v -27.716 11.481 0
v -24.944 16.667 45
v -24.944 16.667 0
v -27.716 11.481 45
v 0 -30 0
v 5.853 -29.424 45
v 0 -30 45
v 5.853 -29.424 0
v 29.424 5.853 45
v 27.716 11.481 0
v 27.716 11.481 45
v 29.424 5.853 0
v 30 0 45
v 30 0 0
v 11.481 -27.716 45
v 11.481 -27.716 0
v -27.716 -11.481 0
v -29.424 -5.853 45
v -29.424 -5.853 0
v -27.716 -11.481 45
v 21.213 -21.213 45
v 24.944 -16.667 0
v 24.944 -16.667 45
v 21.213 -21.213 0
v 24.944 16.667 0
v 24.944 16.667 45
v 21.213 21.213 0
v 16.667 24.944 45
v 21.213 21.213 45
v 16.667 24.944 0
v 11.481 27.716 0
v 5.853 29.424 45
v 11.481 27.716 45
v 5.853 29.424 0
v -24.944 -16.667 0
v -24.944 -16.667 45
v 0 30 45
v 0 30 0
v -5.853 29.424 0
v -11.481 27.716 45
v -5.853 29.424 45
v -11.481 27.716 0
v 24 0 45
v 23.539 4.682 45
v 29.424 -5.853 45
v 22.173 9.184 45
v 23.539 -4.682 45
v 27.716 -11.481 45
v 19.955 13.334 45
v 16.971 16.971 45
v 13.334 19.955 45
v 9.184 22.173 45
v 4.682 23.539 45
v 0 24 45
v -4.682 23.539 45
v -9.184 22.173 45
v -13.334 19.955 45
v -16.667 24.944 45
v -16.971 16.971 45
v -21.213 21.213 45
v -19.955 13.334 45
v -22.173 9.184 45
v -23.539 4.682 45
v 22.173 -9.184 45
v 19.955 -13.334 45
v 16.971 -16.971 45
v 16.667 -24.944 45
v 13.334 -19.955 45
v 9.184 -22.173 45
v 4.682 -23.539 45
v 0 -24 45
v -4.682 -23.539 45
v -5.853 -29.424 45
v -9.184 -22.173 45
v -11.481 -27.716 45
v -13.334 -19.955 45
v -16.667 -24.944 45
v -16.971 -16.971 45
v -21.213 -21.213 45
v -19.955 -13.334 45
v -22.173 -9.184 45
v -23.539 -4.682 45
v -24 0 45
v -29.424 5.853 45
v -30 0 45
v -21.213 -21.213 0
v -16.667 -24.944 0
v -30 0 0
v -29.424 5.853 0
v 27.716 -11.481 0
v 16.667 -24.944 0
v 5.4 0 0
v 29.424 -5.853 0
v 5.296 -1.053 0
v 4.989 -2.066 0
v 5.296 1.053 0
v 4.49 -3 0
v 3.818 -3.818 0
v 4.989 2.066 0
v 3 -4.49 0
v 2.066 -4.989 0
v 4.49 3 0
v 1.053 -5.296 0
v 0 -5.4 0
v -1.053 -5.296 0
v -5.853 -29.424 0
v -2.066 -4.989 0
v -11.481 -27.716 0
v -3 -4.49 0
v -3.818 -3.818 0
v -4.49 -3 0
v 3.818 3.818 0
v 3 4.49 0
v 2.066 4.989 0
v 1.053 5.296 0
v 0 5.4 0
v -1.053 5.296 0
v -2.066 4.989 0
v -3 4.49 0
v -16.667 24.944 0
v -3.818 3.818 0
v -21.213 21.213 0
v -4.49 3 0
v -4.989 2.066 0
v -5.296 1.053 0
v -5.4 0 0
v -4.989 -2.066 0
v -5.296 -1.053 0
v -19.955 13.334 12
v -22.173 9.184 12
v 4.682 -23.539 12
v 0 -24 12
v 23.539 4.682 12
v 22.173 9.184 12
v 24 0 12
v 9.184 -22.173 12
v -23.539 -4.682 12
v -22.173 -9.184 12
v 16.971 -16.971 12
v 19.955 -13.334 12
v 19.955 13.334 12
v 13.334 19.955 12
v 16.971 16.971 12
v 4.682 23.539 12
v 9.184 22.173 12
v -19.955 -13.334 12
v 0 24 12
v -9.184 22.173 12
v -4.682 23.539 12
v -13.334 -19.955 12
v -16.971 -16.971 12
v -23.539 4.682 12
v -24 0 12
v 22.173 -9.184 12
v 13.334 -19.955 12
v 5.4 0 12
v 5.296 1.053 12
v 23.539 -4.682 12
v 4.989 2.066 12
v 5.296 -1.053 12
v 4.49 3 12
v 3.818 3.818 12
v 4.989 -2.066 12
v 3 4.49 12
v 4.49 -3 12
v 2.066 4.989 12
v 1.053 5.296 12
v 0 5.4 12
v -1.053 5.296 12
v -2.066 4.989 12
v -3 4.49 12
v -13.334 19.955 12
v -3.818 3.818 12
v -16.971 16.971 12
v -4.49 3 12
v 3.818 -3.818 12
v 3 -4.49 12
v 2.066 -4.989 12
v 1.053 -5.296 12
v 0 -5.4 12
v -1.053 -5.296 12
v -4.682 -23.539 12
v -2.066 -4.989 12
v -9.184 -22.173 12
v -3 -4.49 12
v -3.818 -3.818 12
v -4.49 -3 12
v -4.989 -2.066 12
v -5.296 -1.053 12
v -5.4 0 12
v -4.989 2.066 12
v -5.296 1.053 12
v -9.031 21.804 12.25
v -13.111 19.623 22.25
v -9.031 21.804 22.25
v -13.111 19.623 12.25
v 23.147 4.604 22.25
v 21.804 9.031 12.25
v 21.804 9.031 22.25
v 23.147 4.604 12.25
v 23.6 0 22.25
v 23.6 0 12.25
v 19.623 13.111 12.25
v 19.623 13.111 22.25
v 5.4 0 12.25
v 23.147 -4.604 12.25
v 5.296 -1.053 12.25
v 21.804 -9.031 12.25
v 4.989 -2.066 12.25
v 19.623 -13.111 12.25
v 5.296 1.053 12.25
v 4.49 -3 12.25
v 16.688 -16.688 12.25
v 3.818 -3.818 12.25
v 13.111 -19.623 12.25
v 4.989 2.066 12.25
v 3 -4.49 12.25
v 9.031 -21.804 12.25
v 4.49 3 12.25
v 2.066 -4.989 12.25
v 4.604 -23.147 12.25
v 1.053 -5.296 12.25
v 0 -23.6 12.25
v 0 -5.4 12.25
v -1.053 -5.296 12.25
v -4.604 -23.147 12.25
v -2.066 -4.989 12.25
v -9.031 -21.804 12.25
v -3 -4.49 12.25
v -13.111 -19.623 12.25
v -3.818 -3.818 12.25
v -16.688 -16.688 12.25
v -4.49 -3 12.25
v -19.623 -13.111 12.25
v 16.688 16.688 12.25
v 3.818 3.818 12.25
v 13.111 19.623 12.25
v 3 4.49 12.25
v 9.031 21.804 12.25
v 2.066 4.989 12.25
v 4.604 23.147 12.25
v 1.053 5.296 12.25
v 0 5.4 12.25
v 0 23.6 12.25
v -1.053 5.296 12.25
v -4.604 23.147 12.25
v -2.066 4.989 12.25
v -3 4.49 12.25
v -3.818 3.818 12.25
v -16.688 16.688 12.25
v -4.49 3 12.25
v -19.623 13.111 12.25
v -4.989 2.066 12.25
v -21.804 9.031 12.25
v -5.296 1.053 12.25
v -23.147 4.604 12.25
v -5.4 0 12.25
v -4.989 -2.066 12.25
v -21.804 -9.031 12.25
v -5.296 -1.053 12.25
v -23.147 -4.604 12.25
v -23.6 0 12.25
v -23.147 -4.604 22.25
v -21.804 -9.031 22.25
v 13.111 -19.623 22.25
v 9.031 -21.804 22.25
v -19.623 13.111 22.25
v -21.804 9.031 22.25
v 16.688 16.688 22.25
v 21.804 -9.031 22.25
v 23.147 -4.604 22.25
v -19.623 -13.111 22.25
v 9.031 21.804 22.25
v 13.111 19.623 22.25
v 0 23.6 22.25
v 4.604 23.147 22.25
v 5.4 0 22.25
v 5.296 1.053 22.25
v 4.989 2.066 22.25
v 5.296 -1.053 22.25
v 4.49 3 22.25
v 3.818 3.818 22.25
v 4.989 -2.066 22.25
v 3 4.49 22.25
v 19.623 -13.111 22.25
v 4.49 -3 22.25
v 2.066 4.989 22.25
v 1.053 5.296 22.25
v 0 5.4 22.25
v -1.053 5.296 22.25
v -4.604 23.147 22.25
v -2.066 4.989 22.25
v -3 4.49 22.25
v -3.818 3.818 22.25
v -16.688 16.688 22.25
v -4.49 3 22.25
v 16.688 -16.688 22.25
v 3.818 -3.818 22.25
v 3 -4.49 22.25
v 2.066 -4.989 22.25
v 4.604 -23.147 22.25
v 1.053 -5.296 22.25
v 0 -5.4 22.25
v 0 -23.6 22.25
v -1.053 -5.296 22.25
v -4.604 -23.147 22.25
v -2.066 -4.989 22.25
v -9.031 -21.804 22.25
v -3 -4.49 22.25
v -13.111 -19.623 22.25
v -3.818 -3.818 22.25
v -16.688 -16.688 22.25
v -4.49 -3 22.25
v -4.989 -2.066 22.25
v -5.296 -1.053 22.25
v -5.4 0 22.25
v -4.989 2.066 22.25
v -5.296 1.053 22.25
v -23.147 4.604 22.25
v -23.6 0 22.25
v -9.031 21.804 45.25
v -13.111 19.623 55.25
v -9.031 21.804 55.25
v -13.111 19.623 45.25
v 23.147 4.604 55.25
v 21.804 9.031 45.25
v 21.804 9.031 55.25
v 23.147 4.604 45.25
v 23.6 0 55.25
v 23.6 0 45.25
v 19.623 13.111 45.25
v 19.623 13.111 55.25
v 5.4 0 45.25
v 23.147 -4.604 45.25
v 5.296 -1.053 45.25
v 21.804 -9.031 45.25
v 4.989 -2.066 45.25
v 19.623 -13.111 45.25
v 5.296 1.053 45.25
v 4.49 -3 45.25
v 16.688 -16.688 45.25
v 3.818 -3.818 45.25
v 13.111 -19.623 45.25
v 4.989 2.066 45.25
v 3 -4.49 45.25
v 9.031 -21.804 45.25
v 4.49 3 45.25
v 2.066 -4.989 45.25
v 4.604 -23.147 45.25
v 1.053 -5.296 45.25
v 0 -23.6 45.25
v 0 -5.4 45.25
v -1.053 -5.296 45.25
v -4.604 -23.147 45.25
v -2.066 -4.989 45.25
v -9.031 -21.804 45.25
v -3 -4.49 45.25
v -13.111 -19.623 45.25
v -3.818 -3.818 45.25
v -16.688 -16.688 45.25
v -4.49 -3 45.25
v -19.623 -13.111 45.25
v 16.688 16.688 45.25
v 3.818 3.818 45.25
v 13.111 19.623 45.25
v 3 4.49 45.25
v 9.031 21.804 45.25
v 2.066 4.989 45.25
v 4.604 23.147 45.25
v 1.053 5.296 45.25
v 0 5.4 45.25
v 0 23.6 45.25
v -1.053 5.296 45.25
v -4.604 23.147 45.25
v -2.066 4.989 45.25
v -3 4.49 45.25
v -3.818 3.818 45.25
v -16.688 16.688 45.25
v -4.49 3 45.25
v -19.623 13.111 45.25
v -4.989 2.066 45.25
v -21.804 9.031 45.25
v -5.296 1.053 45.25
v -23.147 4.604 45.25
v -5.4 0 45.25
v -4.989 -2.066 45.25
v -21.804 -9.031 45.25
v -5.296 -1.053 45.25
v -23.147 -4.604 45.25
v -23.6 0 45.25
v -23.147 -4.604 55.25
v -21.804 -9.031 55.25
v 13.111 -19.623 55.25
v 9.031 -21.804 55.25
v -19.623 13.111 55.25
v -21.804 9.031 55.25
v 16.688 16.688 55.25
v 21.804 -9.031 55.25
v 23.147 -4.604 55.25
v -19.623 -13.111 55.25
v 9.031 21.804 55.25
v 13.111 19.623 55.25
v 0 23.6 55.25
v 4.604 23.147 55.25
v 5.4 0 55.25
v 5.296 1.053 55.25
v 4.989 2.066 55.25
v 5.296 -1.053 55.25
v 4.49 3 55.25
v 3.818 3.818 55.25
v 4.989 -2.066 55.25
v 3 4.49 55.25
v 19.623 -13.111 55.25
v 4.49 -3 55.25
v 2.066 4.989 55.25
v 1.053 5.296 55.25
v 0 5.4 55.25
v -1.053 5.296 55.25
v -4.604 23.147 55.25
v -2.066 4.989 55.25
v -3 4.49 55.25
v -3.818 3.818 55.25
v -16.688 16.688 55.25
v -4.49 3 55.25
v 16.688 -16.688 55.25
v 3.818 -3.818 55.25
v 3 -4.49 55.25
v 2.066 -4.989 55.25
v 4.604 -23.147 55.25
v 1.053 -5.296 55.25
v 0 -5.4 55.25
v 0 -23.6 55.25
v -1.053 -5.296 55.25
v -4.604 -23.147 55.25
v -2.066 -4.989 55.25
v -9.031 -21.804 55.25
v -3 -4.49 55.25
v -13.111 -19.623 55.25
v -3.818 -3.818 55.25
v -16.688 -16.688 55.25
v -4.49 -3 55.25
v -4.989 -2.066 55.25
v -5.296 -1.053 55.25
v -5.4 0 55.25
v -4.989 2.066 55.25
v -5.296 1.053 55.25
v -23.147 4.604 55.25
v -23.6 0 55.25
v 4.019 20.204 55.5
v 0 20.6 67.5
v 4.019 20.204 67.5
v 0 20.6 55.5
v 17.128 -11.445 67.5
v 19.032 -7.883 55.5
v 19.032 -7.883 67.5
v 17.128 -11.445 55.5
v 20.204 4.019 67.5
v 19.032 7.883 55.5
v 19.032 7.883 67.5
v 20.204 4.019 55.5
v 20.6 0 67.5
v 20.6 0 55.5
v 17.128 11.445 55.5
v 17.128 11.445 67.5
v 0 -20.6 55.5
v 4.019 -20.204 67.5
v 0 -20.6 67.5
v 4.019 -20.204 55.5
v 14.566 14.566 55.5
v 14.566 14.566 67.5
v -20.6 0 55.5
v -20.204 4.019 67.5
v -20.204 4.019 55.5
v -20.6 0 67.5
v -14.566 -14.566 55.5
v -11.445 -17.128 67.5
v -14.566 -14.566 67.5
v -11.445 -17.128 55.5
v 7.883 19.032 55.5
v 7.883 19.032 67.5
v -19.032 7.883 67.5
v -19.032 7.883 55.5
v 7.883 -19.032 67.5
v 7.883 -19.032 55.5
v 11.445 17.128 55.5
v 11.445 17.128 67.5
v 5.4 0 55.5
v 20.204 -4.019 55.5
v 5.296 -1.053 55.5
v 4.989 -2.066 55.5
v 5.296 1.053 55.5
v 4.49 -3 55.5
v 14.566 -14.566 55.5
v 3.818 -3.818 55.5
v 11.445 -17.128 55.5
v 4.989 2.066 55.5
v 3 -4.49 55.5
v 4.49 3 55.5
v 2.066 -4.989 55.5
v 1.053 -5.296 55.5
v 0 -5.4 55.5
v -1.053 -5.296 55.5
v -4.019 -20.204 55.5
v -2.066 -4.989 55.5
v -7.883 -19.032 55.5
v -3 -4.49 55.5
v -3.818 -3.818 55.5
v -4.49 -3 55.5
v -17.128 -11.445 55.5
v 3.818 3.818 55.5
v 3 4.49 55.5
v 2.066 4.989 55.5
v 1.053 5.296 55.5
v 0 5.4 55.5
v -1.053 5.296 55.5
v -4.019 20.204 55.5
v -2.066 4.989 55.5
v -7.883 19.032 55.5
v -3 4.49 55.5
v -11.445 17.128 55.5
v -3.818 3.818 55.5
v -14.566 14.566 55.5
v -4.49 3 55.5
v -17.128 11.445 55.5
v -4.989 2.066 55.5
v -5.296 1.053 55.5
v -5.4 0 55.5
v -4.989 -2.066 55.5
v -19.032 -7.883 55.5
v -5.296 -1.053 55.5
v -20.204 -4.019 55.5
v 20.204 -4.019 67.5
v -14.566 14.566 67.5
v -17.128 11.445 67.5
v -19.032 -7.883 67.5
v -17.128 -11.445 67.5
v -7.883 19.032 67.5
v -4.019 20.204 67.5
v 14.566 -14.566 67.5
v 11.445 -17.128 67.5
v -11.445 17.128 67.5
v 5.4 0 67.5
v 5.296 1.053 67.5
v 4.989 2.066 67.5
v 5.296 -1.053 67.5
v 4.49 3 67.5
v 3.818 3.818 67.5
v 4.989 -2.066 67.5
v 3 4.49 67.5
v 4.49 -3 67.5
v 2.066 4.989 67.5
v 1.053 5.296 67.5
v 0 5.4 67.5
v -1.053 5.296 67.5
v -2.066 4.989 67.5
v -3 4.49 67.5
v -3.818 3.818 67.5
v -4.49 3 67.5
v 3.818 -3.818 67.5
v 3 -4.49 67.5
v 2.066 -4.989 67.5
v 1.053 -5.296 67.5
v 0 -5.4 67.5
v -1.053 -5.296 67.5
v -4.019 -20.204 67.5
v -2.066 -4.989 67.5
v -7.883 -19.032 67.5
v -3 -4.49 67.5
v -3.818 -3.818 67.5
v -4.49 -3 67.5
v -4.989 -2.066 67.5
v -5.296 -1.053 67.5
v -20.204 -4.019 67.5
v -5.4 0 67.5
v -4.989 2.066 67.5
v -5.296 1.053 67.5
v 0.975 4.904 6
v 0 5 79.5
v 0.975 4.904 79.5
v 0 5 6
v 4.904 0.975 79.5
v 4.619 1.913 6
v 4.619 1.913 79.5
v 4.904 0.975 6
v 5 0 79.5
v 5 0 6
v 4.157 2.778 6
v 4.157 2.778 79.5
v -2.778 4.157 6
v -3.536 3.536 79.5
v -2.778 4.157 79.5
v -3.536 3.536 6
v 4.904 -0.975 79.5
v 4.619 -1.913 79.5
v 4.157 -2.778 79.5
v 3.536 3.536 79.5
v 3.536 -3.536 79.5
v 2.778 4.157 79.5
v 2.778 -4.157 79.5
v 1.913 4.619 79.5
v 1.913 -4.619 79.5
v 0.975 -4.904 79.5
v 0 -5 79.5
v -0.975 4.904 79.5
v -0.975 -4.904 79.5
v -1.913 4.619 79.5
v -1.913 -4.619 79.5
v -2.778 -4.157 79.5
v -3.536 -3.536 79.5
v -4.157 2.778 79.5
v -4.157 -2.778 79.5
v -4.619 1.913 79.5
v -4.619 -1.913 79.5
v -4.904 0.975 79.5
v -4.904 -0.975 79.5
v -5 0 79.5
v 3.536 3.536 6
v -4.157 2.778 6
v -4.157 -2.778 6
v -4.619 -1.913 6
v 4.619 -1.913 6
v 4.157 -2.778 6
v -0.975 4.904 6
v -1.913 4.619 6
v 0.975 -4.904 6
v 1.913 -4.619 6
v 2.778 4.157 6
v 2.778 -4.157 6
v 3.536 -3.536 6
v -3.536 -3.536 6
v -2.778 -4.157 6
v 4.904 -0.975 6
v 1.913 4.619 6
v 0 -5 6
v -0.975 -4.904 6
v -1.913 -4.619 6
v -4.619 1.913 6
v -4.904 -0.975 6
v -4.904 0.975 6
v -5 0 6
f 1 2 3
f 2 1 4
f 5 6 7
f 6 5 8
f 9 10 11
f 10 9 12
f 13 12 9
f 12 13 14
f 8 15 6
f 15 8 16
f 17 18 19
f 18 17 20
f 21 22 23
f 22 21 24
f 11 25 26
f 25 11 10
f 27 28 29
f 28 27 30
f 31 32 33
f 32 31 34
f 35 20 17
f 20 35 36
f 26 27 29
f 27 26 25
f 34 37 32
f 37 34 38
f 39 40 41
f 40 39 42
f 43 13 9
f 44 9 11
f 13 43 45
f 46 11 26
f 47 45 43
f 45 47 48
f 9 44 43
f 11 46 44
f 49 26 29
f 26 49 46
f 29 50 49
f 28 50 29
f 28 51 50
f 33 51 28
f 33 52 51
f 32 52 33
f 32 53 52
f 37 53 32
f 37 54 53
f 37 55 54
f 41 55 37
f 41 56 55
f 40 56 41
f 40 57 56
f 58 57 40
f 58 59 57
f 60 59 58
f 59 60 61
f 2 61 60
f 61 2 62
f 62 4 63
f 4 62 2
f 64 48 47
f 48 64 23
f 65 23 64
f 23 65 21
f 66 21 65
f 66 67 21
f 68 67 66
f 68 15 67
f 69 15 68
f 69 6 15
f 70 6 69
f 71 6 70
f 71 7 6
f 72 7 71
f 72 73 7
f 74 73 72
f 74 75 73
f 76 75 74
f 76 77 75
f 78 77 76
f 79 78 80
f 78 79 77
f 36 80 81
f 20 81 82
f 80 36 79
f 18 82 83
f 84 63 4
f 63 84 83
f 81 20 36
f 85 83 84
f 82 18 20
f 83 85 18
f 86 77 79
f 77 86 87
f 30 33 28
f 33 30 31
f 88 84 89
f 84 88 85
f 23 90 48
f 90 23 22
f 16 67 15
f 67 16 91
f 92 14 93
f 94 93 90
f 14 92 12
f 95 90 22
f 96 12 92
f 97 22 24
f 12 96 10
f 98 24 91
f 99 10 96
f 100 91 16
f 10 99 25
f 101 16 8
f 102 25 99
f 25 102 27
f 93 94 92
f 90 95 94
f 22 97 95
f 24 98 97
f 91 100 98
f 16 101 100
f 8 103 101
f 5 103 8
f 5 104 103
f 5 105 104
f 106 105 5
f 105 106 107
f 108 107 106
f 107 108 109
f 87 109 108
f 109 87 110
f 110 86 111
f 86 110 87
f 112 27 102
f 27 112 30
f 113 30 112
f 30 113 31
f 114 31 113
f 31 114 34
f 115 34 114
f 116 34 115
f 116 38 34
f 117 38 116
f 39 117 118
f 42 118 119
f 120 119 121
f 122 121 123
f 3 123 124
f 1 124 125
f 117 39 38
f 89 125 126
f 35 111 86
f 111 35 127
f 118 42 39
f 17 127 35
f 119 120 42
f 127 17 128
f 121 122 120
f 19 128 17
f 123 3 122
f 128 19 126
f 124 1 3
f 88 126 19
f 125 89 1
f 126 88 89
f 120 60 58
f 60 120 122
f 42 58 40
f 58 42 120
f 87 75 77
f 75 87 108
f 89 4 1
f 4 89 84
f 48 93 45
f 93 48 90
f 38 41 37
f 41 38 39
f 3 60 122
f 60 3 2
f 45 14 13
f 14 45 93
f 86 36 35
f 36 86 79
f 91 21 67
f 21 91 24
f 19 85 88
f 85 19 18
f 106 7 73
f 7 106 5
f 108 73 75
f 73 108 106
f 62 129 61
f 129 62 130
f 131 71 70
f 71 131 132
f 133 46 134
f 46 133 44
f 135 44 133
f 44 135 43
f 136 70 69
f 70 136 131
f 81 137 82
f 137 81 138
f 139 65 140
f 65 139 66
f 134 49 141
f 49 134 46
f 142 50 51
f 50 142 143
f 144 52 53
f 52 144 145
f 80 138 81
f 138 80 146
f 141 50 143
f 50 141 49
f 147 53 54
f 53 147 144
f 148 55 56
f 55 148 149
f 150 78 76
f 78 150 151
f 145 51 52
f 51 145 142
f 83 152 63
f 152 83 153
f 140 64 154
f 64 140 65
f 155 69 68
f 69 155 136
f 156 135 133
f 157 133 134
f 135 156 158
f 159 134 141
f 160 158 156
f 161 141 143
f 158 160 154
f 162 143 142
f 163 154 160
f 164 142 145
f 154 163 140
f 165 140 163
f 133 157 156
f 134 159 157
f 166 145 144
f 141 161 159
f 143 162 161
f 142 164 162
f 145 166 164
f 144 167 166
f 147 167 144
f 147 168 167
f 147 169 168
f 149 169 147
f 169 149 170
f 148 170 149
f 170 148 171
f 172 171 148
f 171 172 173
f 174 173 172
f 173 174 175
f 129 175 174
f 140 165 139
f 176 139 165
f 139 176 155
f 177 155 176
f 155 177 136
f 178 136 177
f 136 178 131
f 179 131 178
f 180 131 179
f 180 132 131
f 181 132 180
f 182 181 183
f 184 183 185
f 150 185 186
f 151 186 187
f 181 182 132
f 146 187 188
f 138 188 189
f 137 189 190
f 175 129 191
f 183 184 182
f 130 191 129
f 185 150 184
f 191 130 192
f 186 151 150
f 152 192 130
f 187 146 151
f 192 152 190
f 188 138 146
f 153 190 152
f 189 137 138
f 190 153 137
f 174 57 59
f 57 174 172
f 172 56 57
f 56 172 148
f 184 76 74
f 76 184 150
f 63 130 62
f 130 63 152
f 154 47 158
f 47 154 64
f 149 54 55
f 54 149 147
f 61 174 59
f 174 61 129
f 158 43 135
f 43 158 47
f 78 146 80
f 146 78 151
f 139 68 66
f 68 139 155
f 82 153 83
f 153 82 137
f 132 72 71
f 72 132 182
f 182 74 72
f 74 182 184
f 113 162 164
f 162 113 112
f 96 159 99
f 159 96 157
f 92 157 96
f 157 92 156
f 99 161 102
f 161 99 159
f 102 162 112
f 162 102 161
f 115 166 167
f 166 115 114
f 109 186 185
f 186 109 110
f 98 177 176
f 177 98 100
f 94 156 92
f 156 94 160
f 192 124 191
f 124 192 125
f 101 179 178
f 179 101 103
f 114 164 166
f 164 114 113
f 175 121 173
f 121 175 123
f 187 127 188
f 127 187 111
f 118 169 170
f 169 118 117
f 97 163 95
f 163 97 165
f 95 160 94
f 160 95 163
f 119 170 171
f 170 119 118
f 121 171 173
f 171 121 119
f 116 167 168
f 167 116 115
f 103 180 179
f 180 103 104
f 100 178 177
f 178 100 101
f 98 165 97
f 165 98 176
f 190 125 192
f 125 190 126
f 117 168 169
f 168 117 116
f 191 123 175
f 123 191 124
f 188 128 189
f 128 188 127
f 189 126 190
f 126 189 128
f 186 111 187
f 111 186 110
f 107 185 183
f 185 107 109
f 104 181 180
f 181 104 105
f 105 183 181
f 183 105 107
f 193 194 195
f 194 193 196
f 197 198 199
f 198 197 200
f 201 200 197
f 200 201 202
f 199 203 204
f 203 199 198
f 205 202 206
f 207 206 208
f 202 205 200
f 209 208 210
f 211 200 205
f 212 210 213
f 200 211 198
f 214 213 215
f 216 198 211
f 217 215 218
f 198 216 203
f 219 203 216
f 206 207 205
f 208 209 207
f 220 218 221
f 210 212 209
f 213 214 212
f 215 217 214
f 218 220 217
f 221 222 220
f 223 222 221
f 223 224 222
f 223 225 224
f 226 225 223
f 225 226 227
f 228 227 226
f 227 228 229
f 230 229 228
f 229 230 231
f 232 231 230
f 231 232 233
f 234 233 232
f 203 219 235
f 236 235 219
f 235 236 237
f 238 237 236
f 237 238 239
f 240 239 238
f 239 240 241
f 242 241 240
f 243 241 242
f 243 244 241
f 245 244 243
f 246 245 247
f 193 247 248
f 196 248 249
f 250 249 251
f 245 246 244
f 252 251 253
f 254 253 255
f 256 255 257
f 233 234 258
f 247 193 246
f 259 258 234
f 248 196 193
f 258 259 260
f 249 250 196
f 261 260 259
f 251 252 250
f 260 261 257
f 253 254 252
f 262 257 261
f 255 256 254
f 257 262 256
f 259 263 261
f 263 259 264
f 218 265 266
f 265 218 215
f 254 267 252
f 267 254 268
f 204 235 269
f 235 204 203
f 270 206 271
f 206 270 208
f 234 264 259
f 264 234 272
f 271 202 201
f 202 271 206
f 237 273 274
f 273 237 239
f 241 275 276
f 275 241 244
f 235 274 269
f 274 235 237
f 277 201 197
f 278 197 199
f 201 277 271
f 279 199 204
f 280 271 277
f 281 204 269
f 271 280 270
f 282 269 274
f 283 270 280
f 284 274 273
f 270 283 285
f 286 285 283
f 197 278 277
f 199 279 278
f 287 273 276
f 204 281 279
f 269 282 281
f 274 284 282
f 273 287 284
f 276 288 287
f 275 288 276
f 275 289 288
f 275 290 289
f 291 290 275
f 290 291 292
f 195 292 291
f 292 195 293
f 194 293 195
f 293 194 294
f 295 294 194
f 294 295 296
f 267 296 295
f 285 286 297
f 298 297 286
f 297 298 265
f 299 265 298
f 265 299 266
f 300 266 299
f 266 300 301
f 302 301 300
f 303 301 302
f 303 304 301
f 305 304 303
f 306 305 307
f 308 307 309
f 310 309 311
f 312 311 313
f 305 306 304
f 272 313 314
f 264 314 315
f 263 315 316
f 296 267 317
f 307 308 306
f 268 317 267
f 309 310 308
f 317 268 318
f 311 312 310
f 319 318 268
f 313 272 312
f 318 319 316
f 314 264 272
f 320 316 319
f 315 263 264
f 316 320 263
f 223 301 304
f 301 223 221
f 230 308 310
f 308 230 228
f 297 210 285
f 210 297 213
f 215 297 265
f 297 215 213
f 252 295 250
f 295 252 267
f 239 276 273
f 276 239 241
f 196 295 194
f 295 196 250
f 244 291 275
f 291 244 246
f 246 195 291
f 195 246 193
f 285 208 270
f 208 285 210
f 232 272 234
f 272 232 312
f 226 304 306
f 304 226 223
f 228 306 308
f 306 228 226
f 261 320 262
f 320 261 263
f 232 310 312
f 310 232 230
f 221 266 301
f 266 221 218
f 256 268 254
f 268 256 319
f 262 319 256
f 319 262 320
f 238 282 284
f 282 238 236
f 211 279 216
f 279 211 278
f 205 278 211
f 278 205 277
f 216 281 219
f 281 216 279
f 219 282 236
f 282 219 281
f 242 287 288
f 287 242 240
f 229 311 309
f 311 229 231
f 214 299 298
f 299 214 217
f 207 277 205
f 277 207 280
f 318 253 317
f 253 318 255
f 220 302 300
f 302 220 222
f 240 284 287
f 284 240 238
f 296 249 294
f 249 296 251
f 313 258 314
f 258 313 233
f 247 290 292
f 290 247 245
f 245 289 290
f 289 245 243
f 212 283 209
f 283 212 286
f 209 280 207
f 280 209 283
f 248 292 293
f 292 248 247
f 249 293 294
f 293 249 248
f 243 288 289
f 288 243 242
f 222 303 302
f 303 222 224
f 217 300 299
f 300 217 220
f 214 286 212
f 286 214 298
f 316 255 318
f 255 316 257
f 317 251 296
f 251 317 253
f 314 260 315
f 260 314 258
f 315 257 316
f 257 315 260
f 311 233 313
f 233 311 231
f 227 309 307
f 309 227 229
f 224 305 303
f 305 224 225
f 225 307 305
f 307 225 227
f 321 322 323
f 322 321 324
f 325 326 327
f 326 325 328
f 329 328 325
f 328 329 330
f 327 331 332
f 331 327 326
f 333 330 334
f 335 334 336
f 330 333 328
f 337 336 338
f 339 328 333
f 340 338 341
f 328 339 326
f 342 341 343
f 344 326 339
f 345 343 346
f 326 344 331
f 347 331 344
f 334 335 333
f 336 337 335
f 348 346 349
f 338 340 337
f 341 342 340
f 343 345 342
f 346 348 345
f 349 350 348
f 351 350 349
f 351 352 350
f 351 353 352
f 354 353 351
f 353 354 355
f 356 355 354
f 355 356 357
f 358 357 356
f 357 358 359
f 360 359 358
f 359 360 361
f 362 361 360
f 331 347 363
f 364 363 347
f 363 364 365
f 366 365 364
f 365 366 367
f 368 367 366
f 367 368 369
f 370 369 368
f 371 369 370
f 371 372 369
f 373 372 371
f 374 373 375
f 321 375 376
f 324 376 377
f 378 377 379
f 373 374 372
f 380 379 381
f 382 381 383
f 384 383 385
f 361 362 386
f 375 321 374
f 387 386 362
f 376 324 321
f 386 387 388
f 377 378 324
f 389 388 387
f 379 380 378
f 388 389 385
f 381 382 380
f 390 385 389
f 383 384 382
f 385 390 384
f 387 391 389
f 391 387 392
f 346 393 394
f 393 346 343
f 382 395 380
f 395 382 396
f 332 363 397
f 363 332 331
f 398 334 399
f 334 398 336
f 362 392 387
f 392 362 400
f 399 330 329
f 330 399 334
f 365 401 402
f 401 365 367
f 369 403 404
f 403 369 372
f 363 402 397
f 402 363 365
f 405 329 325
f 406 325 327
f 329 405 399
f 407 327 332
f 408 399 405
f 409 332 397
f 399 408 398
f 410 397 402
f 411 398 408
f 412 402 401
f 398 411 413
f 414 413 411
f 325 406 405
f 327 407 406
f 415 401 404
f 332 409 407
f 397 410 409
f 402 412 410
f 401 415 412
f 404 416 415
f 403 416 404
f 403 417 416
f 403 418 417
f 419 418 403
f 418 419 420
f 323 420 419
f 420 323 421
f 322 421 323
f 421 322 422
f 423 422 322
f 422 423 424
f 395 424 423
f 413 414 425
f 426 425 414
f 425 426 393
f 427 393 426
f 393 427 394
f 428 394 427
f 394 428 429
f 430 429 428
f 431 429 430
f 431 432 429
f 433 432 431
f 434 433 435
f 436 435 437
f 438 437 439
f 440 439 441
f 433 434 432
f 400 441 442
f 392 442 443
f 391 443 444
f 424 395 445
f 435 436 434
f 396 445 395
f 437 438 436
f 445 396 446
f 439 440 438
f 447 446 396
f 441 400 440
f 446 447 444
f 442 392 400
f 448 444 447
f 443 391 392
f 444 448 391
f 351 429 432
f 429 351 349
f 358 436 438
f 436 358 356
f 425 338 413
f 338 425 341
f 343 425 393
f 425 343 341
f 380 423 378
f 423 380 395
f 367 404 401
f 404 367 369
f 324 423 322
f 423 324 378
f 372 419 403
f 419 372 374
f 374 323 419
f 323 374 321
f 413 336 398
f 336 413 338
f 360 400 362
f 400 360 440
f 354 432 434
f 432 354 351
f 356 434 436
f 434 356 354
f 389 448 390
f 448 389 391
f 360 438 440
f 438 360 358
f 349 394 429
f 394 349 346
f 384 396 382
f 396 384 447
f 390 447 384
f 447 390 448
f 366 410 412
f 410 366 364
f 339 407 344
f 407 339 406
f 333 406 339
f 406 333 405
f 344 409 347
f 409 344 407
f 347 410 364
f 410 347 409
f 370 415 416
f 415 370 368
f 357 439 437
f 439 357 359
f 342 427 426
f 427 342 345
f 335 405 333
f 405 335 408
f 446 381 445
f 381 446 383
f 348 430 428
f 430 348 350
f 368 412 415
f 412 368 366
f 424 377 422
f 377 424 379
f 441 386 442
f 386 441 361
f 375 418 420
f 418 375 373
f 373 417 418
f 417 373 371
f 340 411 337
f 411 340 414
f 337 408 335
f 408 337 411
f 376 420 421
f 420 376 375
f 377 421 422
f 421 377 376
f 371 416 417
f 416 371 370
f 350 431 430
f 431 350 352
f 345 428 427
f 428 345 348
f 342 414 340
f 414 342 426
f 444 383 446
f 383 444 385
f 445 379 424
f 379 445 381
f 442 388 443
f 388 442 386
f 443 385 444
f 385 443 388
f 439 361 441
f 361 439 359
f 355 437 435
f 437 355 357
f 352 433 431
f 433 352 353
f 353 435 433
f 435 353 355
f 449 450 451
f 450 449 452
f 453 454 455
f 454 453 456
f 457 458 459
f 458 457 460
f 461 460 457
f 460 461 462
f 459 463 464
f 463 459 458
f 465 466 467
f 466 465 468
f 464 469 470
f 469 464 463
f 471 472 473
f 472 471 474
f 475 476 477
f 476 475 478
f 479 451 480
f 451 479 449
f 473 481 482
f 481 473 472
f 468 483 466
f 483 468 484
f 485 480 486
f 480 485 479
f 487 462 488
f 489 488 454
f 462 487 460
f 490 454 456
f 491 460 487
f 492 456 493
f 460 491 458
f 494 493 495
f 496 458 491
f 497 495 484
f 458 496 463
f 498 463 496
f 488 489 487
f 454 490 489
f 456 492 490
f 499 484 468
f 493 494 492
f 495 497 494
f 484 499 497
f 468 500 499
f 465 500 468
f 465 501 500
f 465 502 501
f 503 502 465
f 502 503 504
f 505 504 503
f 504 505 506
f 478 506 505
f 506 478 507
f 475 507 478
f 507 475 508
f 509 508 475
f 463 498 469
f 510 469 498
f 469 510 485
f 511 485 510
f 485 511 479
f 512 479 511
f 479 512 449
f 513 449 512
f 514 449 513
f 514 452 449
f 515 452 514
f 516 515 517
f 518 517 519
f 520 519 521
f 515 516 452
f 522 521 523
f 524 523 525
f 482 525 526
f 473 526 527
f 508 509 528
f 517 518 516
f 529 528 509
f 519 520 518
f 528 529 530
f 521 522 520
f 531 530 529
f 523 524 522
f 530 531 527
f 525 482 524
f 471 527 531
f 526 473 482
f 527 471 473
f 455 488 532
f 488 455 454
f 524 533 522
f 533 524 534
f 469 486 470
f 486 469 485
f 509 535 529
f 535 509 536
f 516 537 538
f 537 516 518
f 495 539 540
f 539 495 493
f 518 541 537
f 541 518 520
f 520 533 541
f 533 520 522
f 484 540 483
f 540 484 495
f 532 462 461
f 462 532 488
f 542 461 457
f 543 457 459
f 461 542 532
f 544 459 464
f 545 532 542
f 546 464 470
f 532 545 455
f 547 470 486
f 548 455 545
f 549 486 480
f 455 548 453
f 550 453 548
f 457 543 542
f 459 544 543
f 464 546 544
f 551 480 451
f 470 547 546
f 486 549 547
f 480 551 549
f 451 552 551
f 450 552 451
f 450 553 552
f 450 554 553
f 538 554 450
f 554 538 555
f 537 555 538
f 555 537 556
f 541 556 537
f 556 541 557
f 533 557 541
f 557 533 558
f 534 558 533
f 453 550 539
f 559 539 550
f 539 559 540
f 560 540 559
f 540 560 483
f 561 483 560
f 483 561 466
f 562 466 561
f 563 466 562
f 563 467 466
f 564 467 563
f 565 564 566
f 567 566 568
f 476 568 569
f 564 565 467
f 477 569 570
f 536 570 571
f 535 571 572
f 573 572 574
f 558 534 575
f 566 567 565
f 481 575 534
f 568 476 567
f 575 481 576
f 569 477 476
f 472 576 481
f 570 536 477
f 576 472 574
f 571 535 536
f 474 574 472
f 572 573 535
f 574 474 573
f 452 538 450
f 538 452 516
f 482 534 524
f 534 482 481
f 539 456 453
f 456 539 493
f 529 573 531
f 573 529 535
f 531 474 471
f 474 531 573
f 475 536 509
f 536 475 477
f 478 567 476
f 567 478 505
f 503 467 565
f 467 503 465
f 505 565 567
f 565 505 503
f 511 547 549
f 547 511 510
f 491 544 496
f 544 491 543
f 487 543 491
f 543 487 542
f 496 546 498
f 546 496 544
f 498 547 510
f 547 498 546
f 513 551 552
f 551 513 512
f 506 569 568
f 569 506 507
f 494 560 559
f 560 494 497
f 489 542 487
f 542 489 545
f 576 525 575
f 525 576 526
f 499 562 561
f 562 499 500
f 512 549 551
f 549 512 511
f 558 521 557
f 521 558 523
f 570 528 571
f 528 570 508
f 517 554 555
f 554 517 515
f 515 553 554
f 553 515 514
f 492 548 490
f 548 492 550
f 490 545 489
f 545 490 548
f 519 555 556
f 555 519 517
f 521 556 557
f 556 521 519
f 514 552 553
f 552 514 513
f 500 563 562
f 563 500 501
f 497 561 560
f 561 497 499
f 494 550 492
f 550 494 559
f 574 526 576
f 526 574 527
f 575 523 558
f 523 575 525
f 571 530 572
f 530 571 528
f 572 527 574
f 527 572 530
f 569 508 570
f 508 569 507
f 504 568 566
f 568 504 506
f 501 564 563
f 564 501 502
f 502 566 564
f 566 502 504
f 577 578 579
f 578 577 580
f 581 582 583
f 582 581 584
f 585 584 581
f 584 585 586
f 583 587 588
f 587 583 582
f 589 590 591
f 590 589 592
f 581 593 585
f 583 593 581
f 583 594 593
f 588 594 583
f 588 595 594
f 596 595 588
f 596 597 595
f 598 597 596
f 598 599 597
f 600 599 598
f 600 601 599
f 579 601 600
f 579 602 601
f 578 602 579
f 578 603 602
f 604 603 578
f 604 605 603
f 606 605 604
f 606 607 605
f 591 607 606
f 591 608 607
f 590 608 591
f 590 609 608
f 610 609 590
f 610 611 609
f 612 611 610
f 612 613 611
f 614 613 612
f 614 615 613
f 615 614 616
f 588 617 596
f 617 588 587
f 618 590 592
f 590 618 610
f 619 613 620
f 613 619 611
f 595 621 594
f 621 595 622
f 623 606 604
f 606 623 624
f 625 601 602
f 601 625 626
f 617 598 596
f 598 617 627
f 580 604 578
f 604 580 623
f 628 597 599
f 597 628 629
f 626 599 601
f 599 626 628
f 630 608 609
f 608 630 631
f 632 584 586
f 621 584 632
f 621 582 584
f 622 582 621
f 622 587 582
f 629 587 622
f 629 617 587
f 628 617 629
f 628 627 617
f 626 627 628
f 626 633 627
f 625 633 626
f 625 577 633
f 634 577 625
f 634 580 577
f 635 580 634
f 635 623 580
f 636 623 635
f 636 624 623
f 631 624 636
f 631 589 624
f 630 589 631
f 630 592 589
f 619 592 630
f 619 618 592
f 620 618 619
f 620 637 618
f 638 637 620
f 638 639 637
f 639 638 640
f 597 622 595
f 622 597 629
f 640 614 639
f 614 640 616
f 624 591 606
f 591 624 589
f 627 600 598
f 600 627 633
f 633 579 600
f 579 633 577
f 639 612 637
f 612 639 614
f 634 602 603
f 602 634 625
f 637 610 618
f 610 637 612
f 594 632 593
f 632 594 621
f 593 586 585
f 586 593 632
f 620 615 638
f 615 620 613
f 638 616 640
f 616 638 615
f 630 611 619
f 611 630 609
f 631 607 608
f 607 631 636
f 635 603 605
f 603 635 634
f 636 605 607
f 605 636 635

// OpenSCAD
$fn = 32;

// ------------------------------------------------------------------------
// Bearing housing: housing d60, two bearings and a shaft
// Every part is its own module, assembly() places them once.
// ------------------------------------------------------------------------

// --- part 1 ---
module housing() {
  difference() {
    cylinder(h = 45, d = 60);
    translate([0, 0, 12]) cylinder(h = 34, d = 48);
    translate([0, 0, -1]) cylinder(h = 14, d = 10.8);
  }
}

// --- part 2 ---
module bearing_lower() {
  difference() {
      translate([0, 0, 0]) cylinder(h = 10, d = 47.2);
      translate([0, 0, -1]) cylinder(h = 12, d = 10.8);
    }
}

// --- part 3 ---
module bearing_upper() {
  difference() {
      translate([0, 0, 0]) cylinder(h = 10, d = 47.2);
      translate([0, 0, -1]) cylinder(h = 12, d = 10.8);
    }
}

// --- part 4 ---
module spacer() {
  difference() {
      translate([0, 0, 0]) cylinder(h = 12, d = 41.2);
      translate([0, 0, -1]) cylinder(h = 14, d = 10.8);
    }
}

// --- part 5 ---
module shaft() {
  translate([0, 0, -36.75]) cylinder(h = 73.5, d = 10);
}

// --- assembly ---
module assembly() {
  translate([0, 0, 0]) rotate([0, 0, 0]) housing();
  translate([0, 0, 12.25]) rotate([0, 0, 0]) bearing_lower();
  translate([0, 0, 45.25]) rotate([0, 0, 0]) bearing_upper();
  translate([0, 0, 55.5]) rotate([0, 0, 0]) spacer();
  translate([0, 0, 42.75]) rotate([0, 0, 0]) shaft();
}

assembly();
